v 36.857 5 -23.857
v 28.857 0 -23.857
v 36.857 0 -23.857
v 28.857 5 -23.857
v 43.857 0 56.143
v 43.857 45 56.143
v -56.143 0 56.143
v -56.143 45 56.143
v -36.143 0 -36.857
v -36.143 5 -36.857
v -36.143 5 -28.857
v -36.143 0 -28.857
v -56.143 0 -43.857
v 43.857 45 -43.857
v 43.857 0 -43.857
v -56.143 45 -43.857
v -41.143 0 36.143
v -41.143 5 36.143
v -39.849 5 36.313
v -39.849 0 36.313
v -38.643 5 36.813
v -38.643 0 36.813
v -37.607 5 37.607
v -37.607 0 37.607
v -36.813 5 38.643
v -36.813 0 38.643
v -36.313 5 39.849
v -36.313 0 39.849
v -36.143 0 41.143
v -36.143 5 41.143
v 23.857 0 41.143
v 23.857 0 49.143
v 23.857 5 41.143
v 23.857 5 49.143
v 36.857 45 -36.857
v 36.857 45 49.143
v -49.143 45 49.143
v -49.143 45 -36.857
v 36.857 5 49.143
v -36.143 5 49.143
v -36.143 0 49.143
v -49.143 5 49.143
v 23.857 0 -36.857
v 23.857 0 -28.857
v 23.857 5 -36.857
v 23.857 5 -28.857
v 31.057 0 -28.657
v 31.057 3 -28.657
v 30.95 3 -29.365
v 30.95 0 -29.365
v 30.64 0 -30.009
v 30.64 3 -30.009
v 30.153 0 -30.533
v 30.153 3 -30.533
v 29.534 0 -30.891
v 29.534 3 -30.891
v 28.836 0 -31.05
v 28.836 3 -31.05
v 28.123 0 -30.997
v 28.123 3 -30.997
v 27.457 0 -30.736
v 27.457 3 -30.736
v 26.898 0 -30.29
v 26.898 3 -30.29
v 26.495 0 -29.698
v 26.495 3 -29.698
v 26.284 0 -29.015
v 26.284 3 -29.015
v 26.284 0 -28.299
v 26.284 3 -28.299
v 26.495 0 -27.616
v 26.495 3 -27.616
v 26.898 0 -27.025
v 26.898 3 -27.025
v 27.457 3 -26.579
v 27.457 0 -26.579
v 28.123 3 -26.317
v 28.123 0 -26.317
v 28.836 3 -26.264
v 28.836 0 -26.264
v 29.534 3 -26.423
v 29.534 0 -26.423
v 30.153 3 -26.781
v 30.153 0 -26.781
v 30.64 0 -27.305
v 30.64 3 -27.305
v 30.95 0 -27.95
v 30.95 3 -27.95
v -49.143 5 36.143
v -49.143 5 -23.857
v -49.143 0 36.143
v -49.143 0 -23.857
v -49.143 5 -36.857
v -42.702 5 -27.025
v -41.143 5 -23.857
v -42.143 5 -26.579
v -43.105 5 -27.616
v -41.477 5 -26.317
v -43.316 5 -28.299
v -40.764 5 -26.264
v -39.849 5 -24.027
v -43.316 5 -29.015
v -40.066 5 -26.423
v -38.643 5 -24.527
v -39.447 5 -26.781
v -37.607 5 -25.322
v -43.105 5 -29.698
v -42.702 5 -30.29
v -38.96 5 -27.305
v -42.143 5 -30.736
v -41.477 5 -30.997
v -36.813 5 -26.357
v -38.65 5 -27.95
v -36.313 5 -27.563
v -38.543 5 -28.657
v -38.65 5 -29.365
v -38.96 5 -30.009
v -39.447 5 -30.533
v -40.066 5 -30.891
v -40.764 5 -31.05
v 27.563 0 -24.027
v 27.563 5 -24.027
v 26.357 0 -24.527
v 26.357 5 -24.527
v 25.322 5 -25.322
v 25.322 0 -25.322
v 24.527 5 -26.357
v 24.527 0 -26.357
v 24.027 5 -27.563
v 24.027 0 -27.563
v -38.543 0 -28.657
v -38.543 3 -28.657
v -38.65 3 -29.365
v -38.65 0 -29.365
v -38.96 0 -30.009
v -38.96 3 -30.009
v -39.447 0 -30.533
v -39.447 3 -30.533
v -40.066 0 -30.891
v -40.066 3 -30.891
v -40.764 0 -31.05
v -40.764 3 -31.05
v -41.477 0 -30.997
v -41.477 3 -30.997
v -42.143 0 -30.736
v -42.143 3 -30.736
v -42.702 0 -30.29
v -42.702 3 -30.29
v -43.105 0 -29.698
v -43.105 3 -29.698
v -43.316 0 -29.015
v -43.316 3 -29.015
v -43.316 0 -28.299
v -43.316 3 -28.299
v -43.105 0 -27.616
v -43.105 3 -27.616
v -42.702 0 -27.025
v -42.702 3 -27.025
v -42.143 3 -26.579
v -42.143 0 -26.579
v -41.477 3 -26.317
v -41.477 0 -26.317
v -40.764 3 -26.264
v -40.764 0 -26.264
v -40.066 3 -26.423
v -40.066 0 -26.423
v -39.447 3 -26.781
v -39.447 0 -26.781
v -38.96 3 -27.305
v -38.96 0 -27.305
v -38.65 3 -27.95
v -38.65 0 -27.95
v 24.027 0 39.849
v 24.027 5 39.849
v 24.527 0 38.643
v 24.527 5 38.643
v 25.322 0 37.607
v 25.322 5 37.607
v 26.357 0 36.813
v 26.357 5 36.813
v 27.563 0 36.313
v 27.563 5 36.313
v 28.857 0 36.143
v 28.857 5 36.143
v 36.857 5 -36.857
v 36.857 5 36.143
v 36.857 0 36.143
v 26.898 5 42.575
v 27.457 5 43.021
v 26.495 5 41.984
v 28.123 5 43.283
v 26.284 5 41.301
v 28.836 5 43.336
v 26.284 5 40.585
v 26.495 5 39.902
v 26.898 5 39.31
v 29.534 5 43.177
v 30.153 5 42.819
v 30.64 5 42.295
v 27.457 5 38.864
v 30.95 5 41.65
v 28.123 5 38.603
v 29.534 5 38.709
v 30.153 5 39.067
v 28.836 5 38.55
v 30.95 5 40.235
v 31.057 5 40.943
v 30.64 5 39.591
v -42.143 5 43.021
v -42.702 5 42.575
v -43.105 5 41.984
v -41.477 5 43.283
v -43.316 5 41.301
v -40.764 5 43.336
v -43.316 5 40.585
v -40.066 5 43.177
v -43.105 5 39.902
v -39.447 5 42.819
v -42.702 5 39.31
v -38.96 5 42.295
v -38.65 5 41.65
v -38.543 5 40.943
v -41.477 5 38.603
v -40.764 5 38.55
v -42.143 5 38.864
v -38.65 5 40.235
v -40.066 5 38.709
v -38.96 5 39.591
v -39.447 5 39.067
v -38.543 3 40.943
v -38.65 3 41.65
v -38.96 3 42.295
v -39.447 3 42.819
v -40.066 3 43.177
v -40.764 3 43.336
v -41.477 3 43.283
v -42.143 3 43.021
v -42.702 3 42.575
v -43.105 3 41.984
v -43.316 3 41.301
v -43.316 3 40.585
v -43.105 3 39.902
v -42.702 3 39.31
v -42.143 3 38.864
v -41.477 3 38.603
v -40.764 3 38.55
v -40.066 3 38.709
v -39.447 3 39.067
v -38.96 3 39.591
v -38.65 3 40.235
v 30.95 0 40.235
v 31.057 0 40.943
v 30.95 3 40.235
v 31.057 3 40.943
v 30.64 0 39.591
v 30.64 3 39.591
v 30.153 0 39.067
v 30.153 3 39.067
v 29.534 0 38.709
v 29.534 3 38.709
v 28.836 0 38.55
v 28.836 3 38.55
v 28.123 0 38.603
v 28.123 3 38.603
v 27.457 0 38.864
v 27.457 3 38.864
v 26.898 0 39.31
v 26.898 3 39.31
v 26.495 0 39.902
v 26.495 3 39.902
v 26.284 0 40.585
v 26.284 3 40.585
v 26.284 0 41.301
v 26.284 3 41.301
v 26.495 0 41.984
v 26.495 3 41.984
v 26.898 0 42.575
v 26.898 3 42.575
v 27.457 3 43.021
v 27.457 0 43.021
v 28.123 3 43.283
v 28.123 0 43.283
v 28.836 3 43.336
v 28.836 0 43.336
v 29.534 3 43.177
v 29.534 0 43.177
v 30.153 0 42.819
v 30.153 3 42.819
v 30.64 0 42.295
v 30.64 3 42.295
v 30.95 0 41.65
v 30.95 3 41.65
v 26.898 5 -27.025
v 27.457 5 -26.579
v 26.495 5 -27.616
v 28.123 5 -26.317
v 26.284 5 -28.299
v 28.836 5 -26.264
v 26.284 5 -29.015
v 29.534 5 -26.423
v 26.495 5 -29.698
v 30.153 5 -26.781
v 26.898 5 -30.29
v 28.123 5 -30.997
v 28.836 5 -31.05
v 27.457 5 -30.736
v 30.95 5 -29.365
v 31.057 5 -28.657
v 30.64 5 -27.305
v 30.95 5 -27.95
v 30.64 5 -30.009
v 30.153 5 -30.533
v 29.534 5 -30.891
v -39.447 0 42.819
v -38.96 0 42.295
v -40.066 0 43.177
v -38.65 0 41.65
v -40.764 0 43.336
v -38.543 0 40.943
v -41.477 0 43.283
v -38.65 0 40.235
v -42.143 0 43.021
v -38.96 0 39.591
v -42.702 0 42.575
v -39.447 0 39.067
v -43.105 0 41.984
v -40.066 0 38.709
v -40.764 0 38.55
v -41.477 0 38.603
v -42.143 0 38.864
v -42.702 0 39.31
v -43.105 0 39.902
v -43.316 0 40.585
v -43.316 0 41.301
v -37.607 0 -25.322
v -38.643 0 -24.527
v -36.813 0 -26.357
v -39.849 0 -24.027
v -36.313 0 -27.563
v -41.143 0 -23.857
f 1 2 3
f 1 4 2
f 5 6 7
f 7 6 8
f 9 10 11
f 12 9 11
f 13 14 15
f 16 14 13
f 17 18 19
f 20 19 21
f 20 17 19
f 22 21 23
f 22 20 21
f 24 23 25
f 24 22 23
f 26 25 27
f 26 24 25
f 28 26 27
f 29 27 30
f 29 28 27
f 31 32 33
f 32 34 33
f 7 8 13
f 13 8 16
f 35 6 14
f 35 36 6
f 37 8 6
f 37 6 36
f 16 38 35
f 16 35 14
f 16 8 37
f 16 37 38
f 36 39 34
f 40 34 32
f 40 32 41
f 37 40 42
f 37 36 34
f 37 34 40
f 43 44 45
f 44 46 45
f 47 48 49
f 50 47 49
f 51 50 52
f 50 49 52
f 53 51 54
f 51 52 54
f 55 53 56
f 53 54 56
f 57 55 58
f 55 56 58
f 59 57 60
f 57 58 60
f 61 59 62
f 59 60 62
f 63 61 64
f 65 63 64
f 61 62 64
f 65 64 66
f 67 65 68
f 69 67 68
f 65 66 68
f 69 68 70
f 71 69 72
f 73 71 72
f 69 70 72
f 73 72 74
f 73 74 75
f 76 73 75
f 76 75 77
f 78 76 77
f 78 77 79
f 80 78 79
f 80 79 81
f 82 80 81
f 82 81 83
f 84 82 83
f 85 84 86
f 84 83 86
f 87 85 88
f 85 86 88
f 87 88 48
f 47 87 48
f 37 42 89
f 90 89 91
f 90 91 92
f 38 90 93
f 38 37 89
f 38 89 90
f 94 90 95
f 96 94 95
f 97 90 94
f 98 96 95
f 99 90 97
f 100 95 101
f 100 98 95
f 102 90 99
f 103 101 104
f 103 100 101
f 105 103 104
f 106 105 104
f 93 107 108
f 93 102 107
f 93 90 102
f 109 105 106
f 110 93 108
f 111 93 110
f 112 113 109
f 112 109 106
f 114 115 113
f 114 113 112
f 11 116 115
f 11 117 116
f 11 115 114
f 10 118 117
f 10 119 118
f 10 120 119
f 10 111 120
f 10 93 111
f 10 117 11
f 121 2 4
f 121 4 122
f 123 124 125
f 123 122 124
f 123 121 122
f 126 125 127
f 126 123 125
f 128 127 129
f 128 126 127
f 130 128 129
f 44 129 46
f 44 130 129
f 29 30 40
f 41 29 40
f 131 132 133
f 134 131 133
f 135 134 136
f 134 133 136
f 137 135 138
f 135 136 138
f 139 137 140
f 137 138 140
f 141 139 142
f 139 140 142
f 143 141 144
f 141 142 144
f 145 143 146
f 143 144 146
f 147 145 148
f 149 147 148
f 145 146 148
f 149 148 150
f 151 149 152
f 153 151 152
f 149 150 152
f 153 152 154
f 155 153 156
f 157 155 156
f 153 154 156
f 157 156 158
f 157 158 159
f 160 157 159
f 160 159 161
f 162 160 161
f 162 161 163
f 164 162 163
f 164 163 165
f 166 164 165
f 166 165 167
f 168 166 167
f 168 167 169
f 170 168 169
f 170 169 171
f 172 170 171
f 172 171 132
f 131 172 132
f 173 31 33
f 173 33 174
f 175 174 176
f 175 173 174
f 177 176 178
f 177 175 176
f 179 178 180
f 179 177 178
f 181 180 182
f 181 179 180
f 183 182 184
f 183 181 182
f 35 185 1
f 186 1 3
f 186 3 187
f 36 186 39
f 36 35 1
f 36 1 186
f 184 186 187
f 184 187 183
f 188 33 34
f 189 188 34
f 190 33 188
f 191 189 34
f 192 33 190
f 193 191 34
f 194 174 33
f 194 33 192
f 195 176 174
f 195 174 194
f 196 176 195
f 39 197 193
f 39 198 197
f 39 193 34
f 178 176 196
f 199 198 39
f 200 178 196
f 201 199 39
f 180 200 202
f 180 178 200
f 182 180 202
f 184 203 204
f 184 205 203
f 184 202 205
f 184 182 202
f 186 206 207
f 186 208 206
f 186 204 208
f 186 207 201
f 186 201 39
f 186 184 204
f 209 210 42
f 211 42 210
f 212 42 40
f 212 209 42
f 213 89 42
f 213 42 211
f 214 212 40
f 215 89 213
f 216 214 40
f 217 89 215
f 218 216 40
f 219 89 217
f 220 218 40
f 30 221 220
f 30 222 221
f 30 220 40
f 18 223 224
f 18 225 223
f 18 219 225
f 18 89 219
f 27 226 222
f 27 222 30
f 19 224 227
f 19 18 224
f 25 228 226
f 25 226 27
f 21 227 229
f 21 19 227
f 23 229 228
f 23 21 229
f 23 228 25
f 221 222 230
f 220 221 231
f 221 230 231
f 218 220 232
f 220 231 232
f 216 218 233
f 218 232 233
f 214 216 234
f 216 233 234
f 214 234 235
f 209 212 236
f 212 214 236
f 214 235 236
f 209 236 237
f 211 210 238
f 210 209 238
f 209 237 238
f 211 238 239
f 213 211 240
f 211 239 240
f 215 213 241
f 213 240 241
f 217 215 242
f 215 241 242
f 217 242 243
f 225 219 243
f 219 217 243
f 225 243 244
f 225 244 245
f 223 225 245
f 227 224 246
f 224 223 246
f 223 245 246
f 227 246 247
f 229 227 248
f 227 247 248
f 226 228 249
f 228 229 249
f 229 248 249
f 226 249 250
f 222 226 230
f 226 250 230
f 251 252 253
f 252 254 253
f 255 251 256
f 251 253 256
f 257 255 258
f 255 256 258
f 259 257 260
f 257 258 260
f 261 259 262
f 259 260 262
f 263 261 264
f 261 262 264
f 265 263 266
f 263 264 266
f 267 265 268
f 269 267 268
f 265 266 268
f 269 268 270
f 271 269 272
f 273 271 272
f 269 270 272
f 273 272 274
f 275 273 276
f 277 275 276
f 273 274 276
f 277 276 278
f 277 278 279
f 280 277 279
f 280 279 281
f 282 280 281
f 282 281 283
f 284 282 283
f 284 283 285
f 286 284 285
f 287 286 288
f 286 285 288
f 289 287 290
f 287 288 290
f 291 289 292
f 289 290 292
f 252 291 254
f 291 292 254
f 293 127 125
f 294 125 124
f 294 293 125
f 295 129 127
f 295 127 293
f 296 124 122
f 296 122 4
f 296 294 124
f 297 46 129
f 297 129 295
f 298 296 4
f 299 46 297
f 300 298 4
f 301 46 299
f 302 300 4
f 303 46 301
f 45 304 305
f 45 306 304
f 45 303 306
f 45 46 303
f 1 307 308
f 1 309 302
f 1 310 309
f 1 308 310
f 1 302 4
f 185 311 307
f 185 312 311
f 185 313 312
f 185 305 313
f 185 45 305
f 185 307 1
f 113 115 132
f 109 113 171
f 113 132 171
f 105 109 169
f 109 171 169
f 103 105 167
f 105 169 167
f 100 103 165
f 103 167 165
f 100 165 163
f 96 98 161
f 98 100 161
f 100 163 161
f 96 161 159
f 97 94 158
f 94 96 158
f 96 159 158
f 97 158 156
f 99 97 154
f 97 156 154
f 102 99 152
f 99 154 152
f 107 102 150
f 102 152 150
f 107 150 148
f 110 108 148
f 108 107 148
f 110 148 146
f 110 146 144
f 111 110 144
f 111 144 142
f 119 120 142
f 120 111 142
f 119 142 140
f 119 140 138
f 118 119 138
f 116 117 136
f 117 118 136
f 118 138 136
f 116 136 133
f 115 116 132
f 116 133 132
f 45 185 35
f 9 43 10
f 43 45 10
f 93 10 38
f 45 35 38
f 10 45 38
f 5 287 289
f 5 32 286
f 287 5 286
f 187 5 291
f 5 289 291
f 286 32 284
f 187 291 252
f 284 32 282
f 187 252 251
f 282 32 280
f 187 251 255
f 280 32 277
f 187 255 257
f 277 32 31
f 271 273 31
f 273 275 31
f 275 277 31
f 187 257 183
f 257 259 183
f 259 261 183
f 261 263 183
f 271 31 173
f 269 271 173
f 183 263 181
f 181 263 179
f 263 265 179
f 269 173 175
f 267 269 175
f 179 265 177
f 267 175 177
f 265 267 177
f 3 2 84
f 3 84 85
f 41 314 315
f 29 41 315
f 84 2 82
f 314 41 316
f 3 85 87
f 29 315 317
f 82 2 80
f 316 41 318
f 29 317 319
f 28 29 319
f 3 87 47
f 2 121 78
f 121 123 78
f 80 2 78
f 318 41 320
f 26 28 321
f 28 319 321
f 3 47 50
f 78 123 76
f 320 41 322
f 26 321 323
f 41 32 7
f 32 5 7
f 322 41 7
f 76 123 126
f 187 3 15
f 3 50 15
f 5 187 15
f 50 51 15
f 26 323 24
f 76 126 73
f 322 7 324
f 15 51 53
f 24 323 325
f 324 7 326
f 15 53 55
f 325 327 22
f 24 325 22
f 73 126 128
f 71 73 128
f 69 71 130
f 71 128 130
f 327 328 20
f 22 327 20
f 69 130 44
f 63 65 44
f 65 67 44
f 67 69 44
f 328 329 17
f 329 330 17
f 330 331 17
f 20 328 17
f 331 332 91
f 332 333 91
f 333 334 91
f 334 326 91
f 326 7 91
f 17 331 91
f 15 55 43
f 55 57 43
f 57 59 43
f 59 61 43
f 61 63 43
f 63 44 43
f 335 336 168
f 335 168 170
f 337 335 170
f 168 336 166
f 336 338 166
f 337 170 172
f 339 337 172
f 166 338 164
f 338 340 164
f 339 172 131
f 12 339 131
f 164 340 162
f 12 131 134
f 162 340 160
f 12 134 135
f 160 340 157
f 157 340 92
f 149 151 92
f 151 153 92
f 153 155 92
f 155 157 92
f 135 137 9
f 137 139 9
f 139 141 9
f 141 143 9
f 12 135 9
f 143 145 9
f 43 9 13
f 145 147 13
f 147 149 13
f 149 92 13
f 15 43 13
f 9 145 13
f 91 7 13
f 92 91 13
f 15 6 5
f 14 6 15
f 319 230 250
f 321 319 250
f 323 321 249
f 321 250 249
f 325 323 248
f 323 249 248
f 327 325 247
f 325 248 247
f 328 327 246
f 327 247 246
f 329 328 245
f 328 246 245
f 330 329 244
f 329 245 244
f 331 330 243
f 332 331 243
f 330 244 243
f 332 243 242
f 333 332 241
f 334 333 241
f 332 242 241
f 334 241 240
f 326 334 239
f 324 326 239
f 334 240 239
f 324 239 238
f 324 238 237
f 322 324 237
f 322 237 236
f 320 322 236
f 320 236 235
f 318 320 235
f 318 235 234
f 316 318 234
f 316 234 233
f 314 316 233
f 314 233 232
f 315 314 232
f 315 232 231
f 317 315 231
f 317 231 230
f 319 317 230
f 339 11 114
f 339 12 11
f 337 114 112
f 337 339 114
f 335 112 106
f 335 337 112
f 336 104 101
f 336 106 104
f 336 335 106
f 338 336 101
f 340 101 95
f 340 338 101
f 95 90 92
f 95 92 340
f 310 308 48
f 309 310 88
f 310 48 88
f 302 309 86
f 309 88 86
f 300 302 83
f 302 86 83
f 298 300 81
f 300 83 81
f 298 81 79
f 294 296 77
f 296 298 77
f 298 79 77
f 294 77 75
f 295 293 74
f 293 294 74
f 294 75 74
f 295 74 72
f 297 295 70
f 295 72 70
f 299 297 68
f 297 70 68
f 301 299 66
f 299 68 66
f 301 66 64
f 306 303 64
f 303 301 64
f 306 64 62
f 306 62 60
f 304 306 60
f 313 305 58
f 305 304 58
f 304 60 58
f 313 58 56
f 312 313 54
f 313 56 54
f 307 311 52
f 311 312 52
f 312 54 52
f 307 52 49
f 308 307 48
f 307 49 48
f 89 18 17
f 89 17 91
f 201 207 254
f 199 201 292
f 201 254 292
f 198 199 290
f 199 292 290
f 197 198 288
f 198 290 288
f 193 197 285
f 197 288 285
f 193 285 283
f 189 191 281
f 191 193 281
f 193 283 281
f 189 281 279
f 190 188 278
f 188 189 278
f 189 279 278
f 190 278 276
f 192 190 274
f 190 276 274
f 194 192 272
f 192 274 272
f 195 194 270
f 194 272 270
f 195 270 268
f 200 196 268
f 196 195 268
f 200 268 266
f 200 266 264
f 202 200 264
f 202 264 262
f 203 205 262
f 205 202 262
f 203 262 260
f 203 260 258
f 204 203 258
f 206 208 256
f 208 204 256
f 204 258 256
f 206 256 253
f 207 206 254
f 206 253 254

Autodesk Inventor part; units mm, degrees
ref_plane "YZ Plane" through (0, 0, 0) normal (1, 0, 0) x (0, 1, 0)
ref_plane "XZ Plane" through (0, 0, 0) normal (0, 1, 0) x (-1, 0, 0)
ref_plane "XY Plane" through (0, 0, 0) normal (0, 0, 1) x (1, 0, 0)
sketch "Sketch1" plane through (0, 0, 0) normal (0, 1, 0) x (-1, 0, 0)
  line L0 (49.1429, 49.1429) -> (-36.8571, 49.1429)
  line L1 (-36.8571, 49.1429) -> (-36.8571, -36.8571)
  line L2 (-36.8571, -36.8571) -> (49.1429, -36.8571)
  line L3 (49.1429, -36.8571) -> (49.1429, 49.1429)
  line L4 (52.1429, 52.1429) -> (-39.8571, 52.1429)
  line L5 (-39.8571, 52.1429) -> (-39.8571, -39.8571)
  line L6 (-39.8571, -39.8571) -> (52.1429, -39.8571)
  line L7 (52.1429, -39.8571) -> (52.1429, 52.1429)
  point P0 (0, 0)
  dimension "d0" = 86
  dimension "d1" = 86
  dimension "d2" = 92
extrude "Extrusion1" add sketch "Sketch1" along normal blind 45 contours L3 L2 L1 L0 | L7 L6 L5 L4
shell "Shell1" thickness 3 removed faces 1 at (9.1905, 45, -9.1905)
sketch "Sketch3" plane through (-49.1429, 3, -36.8571) normal (0, 1, 0) x (1, 0, 0)
  line L0 (86, -86) -> (0, -86) projected
  line L1 (86, 0) -> (0, 0) projected
  line L2 (13, -86) -> (73, -86)
  line L3 (73, -86) -> (73, 0)
  line L4 (73, 0) -> (13, 0)
  line L5 (13, 0) -> (13, -86)
  line L6 (86, 0) -> (86, -86) projected
  line L7 (86, -73) -> (0, -73)
  line L8 (0, -73) -> (0, -13)
  line L9 (0, -13) -> (86, -13)
  line L10 (86, -13) -> (86, -73)
  line L11 (0, -86) -> (0, 0) projected
  point P0 (49.1429, -36.8571)
  point P1 (73, -73)
  point P2 (73, -13)
  point P3 (13, 0)
  point P4 (13, -13)
  point P5 (13, -73)
  point P6 (73, -86)
  dimension "d6" = 13
  dimension "d7" = 13
  dimension "d8" = 13
  dimension "d9" = 13
extrude "Extrusion2" cut sketch "Sketch3" against normal blind 40 contours L0 L5 L7 L3 | L7 L3 L9 L6 | L7 L5 L9 L3 | L7 L8 L9 L5 | L9 L5 L1 L3
sketch "Sketch4" plane through (-49.1429, 3, 36.1429) normal (0, 1, 0) x (1, 0, 0)
  line L0 (86, -13) -> (0, -13) projected
  line L1 (0, -13) -> (0, 73) projected
  line L2 (0, 73) -> (86, 73) projected
  line L3 (86, 73) -> (86, -13) projected
  line L4 (89, -16) -> (89, 76) projected
  line L5 (89, 76) -> (-3, 76) projected
  line L6 (-3, 76) -> (-3, -16) projected
  line L7 (-3, -16) -> (89, -16) projected
  line L8 (8.2, 64.8) -> (8.2, -4.8)
  line L9 (8.2, -4.8) -> (77.8, -4.8)
  line L10 (77.8, -4.8) -> (77.8, 64.8)
  line L11 (77.8, 64.8) -> (8.2, 64.8)
  circle A0 centre (8.2, -4.8) radius 2.4
  circle A1 centre (8.2, 64.8) radius 2.4
  circle A2 centre (77.8, -4.8) radius 2.4
  circle A3 centre (77.8, 64.8) radius 2.4
  point P0 (49.1429, 36.1429)
  dimension "d12" = 69.6
  dimension "d13" = 4.8
  dimension "d14" = 4.8
  dimension "d15" = 4.8
  dimension "d16" = 4.8
extrude "Extrusion3" cut sketch "Sketch4" against normal blind 25 contours L11 A1 L8 | L8 A1 L11 | A0 L9 L8 | L8 L9 A0 | A3 L10 L11 | L11 L10 A3 | A2 L10 L9 | L9 L10 A2
fillet "Fillet1" radius 5 4 edges at (-36.1429, 1.5, 36.1429) (-36.1429, 1.5, -23.8571) (23.8571, 1.5, 36.1429) (23.8571, 1.5, -23.8571)
sketch "Sketch5" plane through (39.8571, 0, 52.1429) normal (1, 0, 0) x (0, 0, -1)
  line L0 (0, 0) -> (92, 0) projected
  line L1 (92, 0) -> (92, 45) projected
  line L2 (0, 45) -> (92, 45) projected
  line L3 (0, 0) -> (0, 45) projected
  point P0 (52.1429, 0)
extrude "Extrusion4" add sketch "Sketch5" along normal blind 4
sketch "Sketch6" plane through (0, 45, 0) normal (0, 1, 0) x (1, 0, 0)
  line L0 (-52.1429, 39.8571) -> (-52.1429, -52.1429) projected
  line L1 (-52.1429, -52.1429) -> (43.8571, -52.1429)
  line L2 (43.8571, -52.1429) -> (43.8571, -56.1429)
  line L3 (43.8571, -56.1429) -> (-52.1429, -56.1429)
  line L4 (-52.1429, -56.1429) -> (-52.1429, -52.1429)
  line L5 (-52.1429, 39.8571) -> (43.8571, 39.8571)
  line L6 (43.8571, 39.8571) -> (43.8571, 43.8571)
  line L7 (43.8571, 43.8571) -> (-52.1429, 43.8571)
  line L8 (-52.1429, 43.8571) -> (-52.1429, 39.8571)
  line L9 (43.8571, 39.8571) -> (43.8571, -52.1429) projected
  line L10 (-52.1429, -56.1429) -> (-56.1429, -56.1429)
  line L11 (-56.1429, -56.1429) -> (-56.1429, 43.8571)
  line L12 (-56.1429, 43.8571) -> (-52.1429, 43.8571)
  line L13 (-52.1429, 43.8571) -> (-52.1429, -56.1429)
  point P0 (0, 0)
  dimension "d22" = 4
  dimension "d23" = 4
  dimension "d26" = 4
extrude "Extrusion5" add sketch "Sketch6" against normal up to surface (45 mm away) contours L8 L7 L6 L5 | L0 L4 L10 L11 L12 L8 | L1 L2 L3 L4
sketch "Sketch7" plane through (-49.1429, 3, -36.8571) normal (0, 1, 0) x (1, 0, 0)
  arc A0 (8, -13) -> (13, -8) centre (8, -8) ccw projected
  line L0 (13, -8) -> (13, 0) projected
  line L1 (13, 0) -> (0, 0) projected
  line L2 (0, 0) -> (0, -13) projected
  line L3 (0, -13) -> (8, -13) projected
  circle A1 centre (8.2, -8.2) radius 2.4 projected
  arc A2 (13, -78) -> (8, -73) centre (8, -78) ccw projected
  line L4 (8, -73) -> (0, -73) projected
  line L5 (0, -73) -> (0, -86) projected
  line L6 (0, -86) -> (13, -86) projected
  line L7 (13, -86) -> (13, -78) projected
  circle A3 centre (8.2, -77.8) radius 2.4 projected
  arc A4 (78, -73) -> (73, -78) centre (78, -78) ccw projected
  line L8 (73, -78) -> (73, -86) projected
  line L9 (73, -86) -> (86, -86) projected
  line L10 (86, -86) -> (86, -73) projected
  line L11 (86, -73) -> (78, -73) projected
  circle A5 centre (77.8, -77.8) radius 2.4 projected
  arc A6 (73, -8) -> (78, -13) centre (78, -8) ccw projected
  line L12 (78, -13) -> (86, -13) projected
  line L13 (86, -13) -> (86, 0) projected
  line L14 (86, 0) -> (73, 0) projected
  line L15 (73, 0) -> (73, -8) projected
  circle A7 centre (77.8, -8.2) radius 2.4 projected
  point P0 (49.1429, -36.8571)
extrude "Extrusion6" add sketch "Sketch7" along normal blind 2
properties part number "BigMotorDerzavka"
